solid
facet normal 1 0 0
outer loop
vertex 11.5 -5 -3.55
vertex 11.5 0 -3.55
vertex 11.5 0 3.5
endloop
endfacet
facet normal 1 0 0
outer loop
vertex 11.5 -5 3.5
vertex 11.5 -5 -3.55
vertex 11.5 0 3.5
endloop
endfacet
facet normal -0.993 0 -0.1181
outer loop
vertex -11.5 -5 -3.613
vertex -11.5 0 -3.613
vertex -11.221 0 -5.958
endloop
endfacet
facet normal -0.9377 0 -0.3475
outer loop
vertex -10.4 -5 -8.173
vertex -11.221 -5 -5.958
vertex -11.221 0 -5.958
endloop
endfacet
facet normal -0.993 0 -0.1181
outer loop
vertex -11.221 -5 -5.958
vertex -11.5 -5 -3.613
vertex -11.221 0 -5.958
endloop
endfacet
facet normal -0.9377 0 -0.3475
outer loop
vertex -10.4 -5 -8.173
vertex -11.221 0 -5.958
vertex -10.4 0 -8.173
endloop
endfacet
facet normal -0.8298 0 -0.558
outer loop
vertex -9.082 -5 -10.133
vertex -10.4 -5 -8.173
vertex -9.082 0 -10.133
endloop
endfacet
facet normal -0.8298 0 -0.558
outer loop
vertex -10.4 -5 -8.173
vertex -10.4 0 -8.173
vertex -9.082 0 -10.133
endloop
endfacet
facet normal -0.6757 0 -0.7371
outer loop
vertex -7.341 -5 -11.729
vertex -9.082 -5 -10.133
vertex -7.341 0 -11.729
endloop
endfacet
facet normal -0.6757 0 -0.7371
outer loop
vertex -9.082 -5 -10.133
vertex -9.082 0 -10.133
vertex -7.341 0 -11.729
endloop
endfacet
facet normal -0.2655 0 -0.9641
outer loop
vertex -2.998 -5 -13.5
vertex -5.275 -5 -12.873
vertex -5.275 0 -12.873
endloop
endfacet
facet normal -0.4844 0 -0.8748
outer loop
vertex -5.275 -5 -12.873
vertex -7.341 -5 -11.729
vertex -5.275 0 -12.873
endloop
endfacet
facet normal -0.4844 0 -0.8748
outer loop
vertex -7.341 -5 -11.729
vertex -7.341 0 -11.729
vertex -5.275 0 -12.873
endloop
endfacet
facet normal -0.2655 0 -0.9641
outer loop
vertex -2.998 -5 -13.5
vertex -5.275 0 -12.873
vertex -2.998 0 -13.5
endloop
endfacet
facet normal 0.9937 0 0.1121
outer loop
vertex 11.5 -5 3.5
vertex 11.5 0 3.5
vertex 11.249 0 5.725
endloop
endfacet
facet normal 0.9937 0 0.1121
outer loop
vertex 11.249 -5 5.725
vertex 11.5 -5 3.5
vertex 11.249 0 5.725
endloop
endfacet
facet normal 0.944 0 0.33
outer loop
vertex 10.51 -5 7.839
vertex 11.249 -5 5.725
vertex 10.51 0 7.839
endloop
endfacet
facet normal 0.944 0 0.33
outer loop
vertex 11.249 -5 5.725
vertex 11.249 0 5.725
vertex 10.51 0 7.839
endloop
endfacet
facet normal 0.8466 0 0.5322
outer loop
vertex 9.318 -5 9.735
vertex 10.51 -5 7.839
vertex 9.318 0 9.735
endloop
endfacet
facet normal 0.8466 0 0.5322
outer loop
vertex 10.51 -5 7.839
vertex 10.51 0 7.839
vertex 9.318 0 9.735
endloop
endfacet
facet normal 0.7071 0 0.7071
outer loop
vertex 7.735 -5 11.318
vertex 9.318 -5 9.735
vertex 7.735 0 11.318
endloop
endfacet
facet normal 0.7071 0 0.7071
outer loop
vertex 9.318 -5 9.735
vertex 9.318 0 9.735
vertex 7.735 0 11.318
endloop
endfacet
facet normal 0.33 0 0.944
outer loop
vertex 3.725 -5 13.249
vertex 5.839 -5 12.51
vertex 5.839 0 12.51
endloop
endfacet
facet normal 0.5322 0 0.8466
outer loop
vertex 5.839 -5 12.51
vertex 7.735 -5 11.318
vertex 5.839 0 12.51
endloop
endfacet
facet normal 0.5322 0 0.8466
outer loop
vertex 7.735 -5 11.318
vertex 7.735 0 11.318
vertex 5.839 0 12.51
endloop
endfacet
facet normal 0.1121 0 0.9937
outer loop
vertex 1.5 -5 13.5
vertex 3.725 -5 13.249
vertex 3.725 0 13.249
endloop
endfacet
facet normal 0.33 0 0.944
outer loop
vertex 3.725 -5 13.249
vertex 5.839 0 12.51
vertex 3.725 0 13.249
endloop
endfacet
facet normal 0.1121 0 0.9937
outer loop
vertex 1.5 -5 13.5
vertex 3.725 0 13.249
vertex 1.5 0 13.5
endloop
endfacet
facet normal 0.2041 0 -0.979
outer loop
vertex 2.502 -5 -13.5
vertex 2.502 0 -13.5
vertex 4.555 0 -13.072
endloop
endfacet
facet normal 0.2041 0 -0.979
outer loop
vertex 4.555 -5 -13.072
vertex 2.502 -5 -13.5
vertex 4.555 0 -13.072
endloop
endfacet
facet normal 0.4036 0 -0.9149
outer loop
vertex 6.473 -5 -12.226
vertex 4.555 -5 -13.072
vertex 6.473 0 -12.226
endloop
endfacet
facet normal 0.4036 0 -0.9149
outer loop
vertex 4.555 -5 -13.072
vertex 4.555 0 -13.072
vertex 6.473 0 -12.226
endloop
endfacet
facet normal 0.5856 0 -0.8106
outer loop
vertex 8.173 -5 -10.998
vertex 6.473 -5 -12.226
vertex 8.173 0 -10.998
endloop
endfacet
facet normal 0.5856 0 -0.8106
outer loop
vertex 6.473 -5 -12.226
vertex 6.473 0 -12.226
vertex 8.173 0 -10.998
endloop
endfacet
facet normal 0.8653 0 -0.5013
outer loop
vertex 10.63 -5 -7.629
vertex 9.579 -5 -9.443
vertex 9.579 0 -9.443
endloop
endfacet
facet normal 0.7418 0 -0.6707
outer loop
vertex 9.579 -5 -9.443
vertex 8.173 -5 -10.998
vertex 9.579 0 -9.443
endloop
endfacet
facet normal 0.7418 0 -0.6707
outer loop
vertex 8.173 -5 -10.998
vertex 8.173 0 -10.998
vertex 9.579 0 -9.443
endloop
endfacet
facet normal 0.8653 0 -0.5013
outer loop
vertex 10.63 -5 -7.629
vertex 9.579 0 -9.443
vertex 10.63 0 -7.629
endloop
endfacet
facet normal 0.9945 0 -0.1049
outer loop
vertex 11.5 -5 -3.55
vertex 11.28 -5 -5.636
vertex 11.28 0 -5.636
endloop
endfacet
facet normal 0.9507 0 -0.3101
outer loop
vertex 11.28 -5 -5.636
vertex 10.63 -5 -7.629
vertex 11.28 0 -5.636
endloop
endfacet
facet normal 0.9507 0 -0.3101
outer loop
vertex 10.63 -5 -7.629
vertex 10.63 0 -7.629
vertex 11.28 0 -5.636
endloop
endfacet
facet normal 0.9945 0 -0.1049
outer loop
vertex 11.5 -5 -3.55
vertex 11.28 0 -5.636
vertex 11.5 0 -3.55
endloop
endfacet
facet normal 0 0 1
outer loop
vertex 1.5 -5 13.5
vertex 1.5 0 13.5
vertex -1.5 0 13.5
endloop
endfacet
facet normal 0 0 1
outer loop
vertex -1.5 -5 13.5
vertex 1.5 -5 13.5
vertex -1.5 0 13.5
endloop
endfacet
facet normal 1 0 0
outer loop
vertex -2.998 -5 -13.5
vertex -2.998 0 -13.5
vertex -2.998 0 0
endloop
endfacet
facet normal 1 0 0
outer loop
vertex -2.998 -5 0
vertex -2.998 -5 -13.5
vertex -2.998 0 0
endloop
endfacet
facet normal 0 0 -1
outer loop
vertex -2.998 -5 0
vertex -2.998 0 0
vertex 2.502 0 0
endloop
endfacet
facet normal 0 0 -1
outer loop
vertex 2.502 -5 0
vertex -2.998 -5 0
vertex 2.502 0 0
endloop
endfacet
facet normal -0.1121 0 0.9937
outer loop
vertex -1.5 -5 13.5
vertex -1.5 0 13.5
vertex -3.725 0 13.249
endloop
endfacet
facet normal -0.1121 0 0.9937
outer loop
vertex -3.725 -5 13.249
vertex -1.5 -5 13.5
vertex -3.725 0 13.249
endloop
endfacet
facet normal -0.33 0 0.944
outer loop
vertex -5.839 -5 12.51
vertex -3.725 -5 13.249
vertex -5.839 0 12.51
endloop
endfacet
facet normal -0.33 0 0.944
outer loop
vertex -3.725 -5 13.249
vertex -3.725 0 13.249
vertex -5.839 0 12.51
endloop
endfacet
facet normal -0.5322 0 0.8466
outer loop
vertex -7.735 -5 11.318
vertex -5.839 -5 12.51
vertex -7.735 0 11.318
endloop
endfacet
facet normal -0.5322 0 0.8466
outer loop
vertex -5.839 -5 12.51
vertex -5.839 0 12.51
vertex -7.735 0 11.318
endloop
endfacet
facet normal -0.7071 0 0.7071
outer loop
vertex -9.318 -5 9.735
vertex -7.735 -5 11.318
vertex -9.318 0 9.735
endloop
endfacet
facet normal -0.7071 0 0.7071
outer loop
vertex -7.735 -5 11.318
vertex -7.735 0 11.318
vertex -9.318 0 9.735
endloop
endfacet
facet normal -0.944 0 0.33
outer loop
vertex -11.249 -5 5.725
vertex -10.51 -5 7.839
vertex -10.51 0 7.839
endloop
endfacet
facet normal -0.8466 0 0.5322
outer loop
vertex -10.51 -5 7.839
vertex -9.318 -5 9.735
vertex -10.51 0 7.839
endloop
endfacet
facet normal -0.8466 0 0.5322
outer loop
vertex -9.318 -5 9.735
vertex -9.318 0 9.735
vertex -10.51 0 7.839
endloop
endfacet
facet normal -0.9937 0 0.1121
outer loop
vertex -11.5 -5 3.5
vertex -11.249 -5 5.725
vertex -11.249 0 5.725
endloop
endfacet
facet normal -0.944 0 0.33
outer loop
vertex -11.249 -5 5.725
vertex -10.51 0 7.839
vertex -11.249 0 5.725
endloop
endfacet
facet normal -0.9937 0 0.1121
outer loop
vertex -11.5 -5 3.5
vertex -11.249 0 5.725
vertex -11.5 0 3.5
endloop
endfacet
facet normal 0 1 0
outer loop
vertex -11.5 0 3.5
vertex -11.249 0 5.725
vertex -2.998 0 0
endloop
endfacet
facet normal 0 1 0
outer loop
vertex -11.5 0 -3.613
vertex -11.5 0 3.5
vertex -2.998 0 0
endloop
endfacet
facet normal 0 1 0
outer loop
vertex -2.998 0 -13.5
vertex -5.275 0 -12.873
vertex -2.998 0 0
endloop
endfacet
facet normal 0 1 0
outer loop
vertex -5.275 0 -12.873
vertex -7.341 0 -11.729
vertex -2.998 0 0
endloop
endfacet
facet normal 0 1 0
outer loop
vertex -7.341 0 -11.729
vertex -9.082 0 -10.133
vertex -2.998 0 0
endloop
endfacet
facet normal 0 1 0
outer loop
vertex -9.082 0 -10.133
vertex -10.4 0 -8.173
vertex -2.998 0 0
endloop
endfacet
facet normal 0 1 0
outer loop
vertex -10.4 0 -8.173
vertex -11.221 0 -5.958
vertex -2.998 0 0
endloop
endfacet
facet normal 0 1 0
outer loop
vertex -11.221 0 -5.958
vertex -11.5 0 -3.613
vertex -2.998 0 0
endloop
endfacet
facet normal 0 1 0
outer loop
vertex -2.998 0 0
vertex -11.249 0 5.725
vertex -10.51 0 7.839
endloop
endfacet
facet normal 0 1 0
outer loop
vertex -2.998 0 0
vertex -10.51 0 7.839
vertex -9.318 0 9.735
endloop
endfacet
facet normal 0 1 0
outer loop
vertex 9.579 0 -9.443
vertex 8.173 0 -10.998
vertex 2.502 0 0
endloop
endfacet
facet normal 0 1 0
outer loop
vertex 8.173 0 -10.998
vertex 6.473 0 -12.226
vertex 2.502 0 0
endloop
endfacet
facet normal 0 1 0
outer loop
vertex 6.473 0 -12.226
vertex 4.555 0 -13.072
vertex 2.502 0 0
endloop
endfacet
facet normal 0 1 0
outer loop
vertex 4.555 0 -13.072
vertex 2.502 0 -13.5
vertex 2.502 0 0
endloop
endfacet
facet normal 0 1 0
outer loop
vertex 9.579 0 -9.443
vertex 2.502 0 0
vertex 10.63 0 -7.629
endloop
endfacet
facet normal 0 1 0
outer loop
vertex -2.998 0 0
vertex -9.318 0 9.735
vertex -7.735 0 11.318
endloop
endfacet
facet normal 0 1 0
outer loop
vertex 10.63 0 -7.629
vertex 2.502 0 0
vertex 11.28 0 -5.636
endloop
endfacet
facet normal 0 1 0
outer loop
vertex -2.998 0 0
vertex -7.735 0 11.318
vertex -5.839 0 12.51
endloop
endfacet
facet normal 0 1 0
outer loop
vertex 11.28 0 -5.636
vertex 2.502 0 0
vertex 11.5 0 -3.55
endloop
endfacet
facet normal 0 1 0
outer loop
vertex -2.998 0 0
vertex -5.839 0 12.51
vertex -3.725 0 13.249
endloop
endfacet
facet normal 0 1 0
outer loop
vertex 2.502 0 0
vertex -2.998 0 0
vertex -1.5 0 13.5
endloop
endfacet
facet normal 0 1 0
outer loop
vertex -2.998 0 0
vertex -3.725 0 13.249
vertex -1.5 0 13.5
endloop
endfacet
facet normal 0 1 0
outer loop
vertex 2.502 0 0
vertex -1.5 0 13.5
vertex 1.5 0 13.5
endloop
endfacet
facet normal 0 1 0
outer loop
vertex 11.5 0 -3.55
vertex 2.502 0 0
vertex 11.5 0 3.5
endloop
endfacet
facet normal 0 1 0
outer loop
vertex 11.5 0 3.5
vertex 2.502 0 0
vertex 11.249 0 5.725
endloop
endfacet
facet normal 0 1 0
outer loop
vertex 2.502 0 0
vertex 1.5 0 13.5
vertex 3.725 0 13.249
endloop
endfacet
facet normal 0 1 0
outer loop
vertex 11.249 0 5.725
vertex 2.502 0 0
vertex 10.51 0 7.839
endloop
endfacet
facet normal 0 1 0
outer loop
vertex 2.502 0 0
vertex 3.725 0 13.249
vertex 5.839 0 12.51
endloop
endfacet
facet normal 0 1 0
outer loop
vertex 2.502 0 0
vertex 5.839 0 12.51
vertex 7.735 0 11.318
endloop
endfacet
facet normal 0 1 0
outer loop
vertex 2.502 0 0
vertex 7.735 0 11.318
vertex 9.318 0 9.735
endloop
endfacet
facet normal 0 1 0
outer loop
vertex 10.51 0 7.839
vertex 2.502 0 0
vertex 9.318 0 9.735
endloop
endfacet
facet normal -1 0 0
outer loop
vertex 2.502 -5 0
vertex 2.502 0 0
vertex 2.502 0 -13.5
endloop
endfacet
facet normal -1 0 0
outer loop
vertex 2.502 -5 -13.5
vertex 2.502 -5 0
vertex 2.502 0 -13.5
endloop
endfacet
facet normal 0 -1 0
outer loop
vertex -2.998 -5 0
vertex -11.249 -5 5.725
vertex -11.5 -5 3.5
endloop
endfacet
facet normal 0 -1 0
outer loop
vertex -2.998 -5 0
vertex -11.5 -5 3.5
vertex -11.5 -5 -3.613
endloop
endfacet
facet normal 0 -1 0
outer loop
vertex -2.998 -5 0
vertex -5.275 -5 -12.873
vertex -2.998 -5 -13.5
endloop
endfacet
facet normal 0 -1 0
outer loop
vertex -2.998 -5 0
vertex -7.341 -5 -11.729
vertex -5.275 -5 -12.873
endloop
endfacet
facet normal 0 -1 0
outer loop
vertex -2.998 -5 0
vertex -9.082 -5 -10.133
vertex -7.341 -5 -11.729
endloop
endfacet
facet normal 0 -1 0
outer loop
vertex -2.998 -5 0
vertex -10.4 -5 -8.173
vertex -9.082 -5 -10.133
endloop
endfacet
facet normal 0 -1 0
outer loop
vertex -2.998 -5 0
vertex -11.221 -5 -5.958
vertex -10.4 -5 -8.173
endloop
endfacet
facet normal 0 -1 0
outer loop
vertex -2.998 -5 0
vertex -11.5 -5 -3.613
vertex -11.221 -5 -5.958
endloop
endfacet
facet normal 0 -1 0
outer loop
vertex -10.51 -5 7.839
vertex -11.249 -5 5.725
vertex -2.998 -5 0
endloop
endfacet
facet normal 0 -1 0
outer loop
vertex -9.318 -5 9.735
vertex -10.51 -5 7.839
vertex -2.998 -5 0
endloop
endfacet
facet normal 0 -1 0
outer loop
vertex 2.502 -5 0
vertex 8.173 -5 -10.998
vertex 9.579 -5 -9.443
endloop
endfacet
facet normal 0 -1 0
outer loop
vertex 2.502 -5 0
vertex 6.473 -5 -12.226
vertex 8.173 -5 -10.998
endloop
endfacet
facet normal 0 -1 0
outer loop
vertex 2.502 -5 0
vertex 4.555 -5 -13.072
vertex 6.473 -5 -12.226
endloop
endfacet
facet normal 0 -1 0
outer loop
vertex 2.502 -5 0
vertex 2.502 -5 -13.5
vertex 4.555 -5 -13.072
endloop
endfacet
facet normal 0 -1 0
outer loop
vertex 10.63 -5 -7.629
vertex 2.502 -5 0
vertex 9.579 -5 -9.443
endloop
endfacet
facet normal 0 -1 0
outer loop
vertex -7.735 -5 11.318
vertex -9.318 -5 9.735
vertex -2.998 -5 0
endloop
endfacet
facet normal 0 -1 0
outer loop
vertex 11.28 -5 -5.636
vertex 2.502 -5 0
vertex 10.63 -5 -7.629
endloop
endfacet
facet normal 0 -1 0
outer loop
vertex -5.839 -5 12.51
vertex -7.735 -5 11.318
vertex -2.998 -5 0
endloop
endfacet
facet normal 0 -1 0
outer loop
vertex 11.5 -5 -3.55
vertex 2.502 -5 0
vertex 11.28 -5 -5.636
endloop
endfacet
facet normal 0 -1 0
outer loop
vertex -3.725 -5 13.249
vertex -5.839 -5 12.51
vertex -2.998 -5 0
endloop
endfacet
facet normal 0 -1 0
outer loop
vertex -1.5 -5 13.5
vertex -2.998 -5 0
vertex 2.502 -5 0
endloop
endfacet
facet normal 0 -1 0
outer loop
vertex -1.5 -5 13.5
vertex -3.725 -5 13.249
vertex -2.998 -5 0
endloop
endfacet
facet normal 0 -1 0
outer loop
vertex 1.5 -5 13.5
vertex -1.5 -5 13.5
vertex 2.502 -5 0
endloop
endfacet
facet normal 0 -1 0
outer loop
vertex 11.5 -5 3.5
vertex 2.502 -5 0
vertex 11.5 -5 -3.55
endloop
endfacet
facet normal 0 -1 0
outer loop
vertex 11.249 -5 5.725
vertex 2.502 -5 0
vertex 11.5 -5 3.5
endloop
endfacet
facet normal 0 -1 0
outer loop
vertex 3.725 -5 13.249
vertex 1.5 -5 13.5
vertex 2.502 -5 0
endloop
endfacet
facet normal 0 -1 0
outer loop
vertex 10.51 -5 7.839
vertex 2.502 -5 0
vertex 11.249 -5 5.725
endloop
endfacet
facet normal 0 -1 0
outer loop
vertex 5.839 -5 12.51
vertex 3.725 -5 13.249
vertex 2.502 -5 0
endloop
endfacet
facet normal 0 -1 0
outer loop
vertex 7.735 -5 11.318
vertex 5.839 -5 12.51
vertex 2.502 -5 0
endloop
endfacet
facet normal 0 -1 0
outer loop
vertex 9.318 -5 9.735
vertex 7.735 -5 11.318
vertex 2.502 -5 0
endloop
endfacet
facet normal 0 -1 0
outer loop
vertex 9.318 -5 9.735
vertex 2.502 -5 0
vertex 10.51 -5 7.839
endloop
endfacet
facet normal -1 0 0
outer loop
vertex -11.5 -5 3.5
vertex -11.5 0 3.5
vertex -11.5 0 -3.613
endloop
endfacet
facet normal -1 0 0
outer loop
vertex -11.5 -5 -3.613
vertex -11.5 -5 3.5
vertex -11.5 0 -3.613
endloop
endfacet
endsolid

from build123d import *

# Parameters (mm, degrees)
F1_DEPTH    = 5
F2_T1_DEPTH = 55
F2_T3_DEPTH = 54.7482455069
F2_T5_DEPTH = 54.435996907


# Not quite as in the source:
# - a fillet or chamfer that OpenCascade refuses, or shapes differently, is made with other operations: its cross-section is extruded or revolved along the edge and cut away or added


with BuildPart() as f1:
    # F0 (on Front) → F1 (new body)
    with BuildSketch(Plane.XZ):
        Polygon((2.5022388734, -13.5), (11.5, -13.5), (11.5, 13.5), (-11.5, 13.5), (-11.5, -13.5), (-2.9977611266, -13.5), (-2.9977611266, 0), (2.5022388734, 0), align=None)
    extrude(amount=F1_DEPTH)

    # F2: fillet of radius 10 on 4 edges, made by hand

    # F2_s2 → F2_t1 (cut)
    with BuildSketch(Plane.XZ.offset(-25)):
        with BuildLine():
            ThreePointArc((-1.5, 13.5), (-8.5710678119, 10.5710678119), (-11.5, 3.5))
            Line((-11.5, 3.5), (-11.5, 13.5))
            Line((-11.5, 13.5), (-1.5, 13.5))
        make_face()
        with BuildLine():
            ThreePointArc((11.5, 3.5), (8.5710678119, 10.5710678119), (1.5, 13.5))
            Line((1.5, 13.5), (11.5, 13.5))
            Line((11.5, 13.5), (11.5, 3.5))
        make_face()
    extrude(amount=F2_T1_DEPTH, mode=Mode.SUBTRACT)

    # F2_s4 → F2_t3 (cut)
    with BuildSketch(Plane.XZ.offset(-24.8741227535)):
        with BuildLine():
            ThreePointArc((2.5022388734, -13.5), (8.9169531728, -10.2577204004), (11.5, -3.5503508986))
            Line((11.5, -3.5503508986), (11.5, -13.5))
            Line((11.5, -13.5), (2.5022388734, -13.5))
        make_face()
    extrude(amount=F2_T3_DEPTH, mode=Mode.SUBTRACT)

    # F2_s6 → F2_t5 (cut)
    with BuildSketch(Plane.XZ.offset(-24.7179984535)):
        with BuildLine():
            ThreePointArc((-11.5, -3.6128006186), (-9.0821372734, -10.132861536), (-2.9977611266, -13.5))
            Line((-2.9977611266, -13.5), (-11.5, -13.5))
            Line((-11.5, -13.5), (-11.5, -3.6128006186))
        make_face()
    extrude(amount=F2_T5_DEPTH, mode=Mode.SUBTRACT)


solid = f1.part
